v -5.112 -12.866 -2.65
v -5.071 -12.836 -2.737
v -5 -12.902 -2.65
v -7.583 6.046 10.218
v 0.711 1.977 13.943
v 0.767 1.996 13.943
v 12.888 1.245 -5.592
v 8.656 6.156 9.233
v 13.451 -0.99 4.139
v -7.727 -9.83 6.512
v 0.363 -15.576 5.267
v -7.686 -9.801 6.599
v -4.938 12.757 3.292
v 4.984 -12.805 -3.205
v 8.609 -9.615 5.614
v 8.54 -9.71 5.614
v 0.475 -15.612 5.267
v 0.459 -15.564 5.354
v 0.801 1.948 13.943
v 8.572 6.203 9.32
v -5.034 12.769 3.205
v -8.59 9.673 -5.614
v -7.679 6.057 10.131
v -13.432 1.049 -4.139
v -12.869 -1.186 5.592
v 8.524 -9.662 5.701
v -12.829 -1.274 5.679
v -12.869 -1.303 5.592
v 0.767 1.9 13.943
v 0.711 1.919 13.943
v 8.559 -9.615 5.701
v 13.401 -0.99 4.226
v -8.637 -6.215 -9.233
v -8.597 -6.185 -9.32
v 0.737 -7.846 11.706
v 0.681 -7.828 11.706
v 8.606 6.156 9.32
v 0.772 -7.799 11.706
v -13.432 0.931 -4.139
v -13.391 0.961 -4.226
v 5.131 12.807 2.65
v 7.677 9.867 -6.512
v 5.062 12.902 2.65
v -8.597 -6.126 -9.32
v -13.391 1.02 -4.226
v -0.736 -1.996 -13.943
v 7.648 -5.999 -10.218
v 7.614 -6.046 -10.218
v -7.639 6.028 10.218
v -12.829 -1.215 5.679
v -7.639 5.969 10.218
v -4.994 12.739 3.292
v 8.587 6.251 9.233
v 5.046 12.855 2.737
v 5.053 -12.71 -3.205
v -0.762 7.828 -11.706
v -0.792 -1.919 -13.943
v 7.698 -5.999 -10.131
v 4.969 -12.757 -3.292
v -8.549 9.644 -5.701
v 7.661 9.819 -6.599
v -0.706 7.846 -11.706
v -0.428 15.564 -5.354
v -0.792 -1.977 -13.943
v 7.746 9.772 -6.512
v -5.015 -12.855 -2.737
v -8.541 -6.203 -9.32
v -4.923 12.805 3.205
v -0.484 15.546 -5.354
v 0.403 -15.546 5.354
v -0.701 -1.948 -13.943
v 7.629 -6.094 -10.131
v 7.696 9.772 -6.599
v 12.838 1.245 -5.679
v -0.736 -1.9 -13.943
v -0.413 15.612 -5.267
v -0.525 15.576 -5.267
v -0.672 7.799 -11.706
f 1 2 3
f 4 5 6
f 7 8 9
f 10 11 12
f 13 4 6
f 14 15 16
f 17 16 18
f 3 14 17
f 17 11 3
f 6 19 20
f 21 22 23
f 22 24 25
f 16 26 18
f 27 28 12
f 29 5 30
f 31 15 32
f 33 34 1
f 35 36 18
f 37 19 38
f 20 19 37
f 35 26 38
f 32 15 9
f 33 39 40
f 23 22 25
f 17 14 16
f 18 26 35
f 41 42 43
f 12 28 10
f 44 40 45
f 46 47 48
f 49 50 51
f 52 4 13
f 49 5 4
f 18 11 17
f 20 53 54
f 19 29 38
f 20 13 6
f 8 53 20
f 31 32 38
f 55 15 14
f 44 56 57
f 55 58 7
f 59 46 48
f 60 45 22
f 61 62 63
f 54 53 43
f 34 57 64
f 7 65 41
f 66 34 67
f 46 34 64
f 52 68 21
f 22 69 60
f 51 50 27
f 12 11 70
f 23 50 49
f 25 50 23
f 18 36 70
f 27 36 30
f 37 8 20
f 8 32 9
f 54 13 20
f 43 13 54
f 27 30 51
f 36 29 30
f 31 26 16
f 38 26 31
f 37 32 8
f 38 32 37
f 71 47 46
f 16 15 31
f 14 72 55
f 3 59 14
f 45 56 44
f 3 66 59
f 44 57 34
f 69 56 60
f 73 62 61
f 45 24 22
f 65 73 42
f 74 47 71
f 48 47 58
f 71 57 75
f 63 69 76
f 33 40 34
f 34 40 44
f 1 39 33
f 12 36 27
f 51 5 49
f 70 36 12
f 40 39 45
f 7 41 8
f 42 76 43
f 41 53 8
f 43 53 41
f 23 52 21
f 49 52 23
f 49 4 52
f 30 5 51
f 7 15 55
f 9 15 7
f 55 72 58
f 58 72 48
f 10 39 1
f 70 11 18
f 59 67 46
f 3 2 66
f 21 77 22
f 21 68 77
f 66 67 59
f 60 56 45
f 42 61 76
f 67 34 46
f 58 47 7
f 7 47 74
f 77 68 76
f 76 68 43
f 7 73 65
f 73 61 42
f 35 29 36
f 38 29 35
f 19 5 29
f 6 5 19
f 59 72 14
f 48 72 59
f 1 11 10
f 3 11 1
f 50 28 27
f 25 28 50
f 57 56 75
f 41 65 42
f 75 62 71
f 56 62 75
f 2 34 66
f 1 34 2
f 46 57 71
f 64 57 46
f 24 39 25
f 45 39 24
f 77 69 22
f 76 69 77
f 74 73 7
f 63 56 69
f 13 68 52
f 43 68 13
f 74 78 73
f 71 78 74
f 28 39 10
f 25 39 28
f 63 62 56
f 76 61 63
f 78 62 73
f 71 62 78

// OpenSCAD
// Auto-generated OpenSCAD file

    inner_points = 10*[[-1.3350698747901557, 0.0990218864340161, -0.41389441527673243], [0.8508637948042702, -0.9614534950051333, 0.5613942208431721], [-0.8508637948042702, 0.9614534950051333, -0.5613942208431721], [1.3350698747901557, -0.0990218864340161, 0.41389441527673243], [-0.07512626496626917, -0.194799963559733, -1.385617014211274], [0.7598260996660189, -0.5998655150369786, -1.013089904054999], [-0.7598260996660189, 0.5998655150369786, 1.013089904054999], [0.07512626496626917, 0.194799963559733, 1.385617014211274], [-0.5030679550992645, -1.280705233674586, -0.26503250471063], [0.7646000198631342, 0.9771700305368443, -0.6511920090175702], [-0.7646000198631342, -0.9771700305368443, 0.6511920090175702], [0.5030679550992645, 1.280705233674586, 0.26503250471063], [-0.8556377150013853, -0.6155820505686895, -0.9232921158806008], [0.4953435899607525, -1.2709918805305933, -0.3205305899169714], [-0.07217582002487244, 0.7798616050716232, -1.1619518146211012], [1.2788054849372654, 0.12445177510971961, -0.5591902886574719], [-1.2788054849372654, -0.12445177510971961, 0.5591902886574719], [0.07217582002487244, -0.7798616050716232, 1.1619518146211012], [-0.4953435899607525, 1.2709918805305933, 0.3205305899169714], [0.8556377150013853, 0.6155820505686895, 0.9232921158806008], [0.0443746617590165, -1.5516849543996245, 0.5267228692547999], [-0.0443746617590165, 1.5516849543996245, -0.5267228692547999]];

    outer_points = 10*[[0.6669622706403558, -0.020873051468661752, 1.2321733387908815], [-0.49050024063185305, 0.9496265660238541, -0.9061701775076568], [0.49050024063185305, -0.9496265660238541, 0.9061701775076568], [-0.6669622706403558, 0.020873051468661752, -1.2321733387908815], [1.372245669008736, -0.18534893390668453, -0.2147395821660355], [0.9301343304065605, 0.18534893390668453, -1.0315141257691125], [-0.9301343304065605, -0.18534893390668453, 1.0315141257691125], [-1.372245669008736, 0.18534893390668453, 0.2147395821660355], [0.6707072485223723, 1.215754134138207, 0.18873039942687714], [0.20872365623630781, -1.215754134138207, -0.6647569572525192], [-0.20872365623630781, 1.215754134138207, 0.6647569572525192], [-0.6707072485223723, -1.215754134138207, -0.18873039942687714], [1.2119109148021057, 0.4514765020210374, 0.5394130089910635], [0.4965597421320721, 1.0512782517001842, -0.782155963704398], [0.926389352524544, -1.0512782517001842, 0.011928813594892007], [0.21103817985451057, -0.4514765020210374, -1.3096401591005695], [-0.21103817985451057, 0.4514765020210374, 1.3096401591005695], [-0.926389352524544, 1.0512782517001842, -0.011928813594892007], [-0.4965597421320721, -1.0512782517001842, 0.782155963704398], [-1.2119109148021057, -0.4514765020210374, -0.5394130089910635], [-0.1349496014656266, 1.6145478368697694, -0.24931140534644022], [0.1349496014656266, -1.6145478368697694, 0.24931140534644022]];

    // Convex hull for inner set (I)
    module inner_hull() {
        hull() {
            for (p = inner_points) {
                translate(p) sphere(r=0.1);
            }
        }
    }

    // Convex hull for outer set (O) minus inner hull (O \ I)
    module outer_minus_inner() {
        difference() {
            hull() {
                for (p = outer_points) {
                    translate(p) sphere(r=0.1);
                }
            }
            inner_hull(); // Subtract inner hull
        }
    }

    // Convex hull for outer set (O) minus all translated inner hulls
    module outer_minus_AllTranslationInner() {
        difference() {
            hull() {
                for (p = outer_points) {
                    translate(p) sphere(r=0.1);
                }
            }
            hull() {
                translate([0,0,50]) inner_hull();
                translate([0,0,-50]) inner_hull();
            }; // Subtract translated inner hulls
        }
    }

    // Difference between outer_minus_inner and outer_minus_AllTranslationInner
    module outer_minus_inner_diff() {
        difference() {
            // Outer minus inner
            difference() {
                hull() {
                    for (p = outer_points) {
                        translate(p) sphere(r=0.1);
                    }
                }
                inner_hull();
            }

            // Subtract Outer minus AllTranslationInner
            difference() {
                hull() {
                    for (p = outer_points) {
                        translate(p) sphere(r=0.1);
                    }
                }
                hull() {
                    translate([0,0,50]) inner_hull();
                    translate([0,0,-50]) inner_hull();
                };
            }
        }
    }

    // Rendering all with colors applied
    color([1, 0, 0, 0.5]) inner_hull(); // Transparent red
    
